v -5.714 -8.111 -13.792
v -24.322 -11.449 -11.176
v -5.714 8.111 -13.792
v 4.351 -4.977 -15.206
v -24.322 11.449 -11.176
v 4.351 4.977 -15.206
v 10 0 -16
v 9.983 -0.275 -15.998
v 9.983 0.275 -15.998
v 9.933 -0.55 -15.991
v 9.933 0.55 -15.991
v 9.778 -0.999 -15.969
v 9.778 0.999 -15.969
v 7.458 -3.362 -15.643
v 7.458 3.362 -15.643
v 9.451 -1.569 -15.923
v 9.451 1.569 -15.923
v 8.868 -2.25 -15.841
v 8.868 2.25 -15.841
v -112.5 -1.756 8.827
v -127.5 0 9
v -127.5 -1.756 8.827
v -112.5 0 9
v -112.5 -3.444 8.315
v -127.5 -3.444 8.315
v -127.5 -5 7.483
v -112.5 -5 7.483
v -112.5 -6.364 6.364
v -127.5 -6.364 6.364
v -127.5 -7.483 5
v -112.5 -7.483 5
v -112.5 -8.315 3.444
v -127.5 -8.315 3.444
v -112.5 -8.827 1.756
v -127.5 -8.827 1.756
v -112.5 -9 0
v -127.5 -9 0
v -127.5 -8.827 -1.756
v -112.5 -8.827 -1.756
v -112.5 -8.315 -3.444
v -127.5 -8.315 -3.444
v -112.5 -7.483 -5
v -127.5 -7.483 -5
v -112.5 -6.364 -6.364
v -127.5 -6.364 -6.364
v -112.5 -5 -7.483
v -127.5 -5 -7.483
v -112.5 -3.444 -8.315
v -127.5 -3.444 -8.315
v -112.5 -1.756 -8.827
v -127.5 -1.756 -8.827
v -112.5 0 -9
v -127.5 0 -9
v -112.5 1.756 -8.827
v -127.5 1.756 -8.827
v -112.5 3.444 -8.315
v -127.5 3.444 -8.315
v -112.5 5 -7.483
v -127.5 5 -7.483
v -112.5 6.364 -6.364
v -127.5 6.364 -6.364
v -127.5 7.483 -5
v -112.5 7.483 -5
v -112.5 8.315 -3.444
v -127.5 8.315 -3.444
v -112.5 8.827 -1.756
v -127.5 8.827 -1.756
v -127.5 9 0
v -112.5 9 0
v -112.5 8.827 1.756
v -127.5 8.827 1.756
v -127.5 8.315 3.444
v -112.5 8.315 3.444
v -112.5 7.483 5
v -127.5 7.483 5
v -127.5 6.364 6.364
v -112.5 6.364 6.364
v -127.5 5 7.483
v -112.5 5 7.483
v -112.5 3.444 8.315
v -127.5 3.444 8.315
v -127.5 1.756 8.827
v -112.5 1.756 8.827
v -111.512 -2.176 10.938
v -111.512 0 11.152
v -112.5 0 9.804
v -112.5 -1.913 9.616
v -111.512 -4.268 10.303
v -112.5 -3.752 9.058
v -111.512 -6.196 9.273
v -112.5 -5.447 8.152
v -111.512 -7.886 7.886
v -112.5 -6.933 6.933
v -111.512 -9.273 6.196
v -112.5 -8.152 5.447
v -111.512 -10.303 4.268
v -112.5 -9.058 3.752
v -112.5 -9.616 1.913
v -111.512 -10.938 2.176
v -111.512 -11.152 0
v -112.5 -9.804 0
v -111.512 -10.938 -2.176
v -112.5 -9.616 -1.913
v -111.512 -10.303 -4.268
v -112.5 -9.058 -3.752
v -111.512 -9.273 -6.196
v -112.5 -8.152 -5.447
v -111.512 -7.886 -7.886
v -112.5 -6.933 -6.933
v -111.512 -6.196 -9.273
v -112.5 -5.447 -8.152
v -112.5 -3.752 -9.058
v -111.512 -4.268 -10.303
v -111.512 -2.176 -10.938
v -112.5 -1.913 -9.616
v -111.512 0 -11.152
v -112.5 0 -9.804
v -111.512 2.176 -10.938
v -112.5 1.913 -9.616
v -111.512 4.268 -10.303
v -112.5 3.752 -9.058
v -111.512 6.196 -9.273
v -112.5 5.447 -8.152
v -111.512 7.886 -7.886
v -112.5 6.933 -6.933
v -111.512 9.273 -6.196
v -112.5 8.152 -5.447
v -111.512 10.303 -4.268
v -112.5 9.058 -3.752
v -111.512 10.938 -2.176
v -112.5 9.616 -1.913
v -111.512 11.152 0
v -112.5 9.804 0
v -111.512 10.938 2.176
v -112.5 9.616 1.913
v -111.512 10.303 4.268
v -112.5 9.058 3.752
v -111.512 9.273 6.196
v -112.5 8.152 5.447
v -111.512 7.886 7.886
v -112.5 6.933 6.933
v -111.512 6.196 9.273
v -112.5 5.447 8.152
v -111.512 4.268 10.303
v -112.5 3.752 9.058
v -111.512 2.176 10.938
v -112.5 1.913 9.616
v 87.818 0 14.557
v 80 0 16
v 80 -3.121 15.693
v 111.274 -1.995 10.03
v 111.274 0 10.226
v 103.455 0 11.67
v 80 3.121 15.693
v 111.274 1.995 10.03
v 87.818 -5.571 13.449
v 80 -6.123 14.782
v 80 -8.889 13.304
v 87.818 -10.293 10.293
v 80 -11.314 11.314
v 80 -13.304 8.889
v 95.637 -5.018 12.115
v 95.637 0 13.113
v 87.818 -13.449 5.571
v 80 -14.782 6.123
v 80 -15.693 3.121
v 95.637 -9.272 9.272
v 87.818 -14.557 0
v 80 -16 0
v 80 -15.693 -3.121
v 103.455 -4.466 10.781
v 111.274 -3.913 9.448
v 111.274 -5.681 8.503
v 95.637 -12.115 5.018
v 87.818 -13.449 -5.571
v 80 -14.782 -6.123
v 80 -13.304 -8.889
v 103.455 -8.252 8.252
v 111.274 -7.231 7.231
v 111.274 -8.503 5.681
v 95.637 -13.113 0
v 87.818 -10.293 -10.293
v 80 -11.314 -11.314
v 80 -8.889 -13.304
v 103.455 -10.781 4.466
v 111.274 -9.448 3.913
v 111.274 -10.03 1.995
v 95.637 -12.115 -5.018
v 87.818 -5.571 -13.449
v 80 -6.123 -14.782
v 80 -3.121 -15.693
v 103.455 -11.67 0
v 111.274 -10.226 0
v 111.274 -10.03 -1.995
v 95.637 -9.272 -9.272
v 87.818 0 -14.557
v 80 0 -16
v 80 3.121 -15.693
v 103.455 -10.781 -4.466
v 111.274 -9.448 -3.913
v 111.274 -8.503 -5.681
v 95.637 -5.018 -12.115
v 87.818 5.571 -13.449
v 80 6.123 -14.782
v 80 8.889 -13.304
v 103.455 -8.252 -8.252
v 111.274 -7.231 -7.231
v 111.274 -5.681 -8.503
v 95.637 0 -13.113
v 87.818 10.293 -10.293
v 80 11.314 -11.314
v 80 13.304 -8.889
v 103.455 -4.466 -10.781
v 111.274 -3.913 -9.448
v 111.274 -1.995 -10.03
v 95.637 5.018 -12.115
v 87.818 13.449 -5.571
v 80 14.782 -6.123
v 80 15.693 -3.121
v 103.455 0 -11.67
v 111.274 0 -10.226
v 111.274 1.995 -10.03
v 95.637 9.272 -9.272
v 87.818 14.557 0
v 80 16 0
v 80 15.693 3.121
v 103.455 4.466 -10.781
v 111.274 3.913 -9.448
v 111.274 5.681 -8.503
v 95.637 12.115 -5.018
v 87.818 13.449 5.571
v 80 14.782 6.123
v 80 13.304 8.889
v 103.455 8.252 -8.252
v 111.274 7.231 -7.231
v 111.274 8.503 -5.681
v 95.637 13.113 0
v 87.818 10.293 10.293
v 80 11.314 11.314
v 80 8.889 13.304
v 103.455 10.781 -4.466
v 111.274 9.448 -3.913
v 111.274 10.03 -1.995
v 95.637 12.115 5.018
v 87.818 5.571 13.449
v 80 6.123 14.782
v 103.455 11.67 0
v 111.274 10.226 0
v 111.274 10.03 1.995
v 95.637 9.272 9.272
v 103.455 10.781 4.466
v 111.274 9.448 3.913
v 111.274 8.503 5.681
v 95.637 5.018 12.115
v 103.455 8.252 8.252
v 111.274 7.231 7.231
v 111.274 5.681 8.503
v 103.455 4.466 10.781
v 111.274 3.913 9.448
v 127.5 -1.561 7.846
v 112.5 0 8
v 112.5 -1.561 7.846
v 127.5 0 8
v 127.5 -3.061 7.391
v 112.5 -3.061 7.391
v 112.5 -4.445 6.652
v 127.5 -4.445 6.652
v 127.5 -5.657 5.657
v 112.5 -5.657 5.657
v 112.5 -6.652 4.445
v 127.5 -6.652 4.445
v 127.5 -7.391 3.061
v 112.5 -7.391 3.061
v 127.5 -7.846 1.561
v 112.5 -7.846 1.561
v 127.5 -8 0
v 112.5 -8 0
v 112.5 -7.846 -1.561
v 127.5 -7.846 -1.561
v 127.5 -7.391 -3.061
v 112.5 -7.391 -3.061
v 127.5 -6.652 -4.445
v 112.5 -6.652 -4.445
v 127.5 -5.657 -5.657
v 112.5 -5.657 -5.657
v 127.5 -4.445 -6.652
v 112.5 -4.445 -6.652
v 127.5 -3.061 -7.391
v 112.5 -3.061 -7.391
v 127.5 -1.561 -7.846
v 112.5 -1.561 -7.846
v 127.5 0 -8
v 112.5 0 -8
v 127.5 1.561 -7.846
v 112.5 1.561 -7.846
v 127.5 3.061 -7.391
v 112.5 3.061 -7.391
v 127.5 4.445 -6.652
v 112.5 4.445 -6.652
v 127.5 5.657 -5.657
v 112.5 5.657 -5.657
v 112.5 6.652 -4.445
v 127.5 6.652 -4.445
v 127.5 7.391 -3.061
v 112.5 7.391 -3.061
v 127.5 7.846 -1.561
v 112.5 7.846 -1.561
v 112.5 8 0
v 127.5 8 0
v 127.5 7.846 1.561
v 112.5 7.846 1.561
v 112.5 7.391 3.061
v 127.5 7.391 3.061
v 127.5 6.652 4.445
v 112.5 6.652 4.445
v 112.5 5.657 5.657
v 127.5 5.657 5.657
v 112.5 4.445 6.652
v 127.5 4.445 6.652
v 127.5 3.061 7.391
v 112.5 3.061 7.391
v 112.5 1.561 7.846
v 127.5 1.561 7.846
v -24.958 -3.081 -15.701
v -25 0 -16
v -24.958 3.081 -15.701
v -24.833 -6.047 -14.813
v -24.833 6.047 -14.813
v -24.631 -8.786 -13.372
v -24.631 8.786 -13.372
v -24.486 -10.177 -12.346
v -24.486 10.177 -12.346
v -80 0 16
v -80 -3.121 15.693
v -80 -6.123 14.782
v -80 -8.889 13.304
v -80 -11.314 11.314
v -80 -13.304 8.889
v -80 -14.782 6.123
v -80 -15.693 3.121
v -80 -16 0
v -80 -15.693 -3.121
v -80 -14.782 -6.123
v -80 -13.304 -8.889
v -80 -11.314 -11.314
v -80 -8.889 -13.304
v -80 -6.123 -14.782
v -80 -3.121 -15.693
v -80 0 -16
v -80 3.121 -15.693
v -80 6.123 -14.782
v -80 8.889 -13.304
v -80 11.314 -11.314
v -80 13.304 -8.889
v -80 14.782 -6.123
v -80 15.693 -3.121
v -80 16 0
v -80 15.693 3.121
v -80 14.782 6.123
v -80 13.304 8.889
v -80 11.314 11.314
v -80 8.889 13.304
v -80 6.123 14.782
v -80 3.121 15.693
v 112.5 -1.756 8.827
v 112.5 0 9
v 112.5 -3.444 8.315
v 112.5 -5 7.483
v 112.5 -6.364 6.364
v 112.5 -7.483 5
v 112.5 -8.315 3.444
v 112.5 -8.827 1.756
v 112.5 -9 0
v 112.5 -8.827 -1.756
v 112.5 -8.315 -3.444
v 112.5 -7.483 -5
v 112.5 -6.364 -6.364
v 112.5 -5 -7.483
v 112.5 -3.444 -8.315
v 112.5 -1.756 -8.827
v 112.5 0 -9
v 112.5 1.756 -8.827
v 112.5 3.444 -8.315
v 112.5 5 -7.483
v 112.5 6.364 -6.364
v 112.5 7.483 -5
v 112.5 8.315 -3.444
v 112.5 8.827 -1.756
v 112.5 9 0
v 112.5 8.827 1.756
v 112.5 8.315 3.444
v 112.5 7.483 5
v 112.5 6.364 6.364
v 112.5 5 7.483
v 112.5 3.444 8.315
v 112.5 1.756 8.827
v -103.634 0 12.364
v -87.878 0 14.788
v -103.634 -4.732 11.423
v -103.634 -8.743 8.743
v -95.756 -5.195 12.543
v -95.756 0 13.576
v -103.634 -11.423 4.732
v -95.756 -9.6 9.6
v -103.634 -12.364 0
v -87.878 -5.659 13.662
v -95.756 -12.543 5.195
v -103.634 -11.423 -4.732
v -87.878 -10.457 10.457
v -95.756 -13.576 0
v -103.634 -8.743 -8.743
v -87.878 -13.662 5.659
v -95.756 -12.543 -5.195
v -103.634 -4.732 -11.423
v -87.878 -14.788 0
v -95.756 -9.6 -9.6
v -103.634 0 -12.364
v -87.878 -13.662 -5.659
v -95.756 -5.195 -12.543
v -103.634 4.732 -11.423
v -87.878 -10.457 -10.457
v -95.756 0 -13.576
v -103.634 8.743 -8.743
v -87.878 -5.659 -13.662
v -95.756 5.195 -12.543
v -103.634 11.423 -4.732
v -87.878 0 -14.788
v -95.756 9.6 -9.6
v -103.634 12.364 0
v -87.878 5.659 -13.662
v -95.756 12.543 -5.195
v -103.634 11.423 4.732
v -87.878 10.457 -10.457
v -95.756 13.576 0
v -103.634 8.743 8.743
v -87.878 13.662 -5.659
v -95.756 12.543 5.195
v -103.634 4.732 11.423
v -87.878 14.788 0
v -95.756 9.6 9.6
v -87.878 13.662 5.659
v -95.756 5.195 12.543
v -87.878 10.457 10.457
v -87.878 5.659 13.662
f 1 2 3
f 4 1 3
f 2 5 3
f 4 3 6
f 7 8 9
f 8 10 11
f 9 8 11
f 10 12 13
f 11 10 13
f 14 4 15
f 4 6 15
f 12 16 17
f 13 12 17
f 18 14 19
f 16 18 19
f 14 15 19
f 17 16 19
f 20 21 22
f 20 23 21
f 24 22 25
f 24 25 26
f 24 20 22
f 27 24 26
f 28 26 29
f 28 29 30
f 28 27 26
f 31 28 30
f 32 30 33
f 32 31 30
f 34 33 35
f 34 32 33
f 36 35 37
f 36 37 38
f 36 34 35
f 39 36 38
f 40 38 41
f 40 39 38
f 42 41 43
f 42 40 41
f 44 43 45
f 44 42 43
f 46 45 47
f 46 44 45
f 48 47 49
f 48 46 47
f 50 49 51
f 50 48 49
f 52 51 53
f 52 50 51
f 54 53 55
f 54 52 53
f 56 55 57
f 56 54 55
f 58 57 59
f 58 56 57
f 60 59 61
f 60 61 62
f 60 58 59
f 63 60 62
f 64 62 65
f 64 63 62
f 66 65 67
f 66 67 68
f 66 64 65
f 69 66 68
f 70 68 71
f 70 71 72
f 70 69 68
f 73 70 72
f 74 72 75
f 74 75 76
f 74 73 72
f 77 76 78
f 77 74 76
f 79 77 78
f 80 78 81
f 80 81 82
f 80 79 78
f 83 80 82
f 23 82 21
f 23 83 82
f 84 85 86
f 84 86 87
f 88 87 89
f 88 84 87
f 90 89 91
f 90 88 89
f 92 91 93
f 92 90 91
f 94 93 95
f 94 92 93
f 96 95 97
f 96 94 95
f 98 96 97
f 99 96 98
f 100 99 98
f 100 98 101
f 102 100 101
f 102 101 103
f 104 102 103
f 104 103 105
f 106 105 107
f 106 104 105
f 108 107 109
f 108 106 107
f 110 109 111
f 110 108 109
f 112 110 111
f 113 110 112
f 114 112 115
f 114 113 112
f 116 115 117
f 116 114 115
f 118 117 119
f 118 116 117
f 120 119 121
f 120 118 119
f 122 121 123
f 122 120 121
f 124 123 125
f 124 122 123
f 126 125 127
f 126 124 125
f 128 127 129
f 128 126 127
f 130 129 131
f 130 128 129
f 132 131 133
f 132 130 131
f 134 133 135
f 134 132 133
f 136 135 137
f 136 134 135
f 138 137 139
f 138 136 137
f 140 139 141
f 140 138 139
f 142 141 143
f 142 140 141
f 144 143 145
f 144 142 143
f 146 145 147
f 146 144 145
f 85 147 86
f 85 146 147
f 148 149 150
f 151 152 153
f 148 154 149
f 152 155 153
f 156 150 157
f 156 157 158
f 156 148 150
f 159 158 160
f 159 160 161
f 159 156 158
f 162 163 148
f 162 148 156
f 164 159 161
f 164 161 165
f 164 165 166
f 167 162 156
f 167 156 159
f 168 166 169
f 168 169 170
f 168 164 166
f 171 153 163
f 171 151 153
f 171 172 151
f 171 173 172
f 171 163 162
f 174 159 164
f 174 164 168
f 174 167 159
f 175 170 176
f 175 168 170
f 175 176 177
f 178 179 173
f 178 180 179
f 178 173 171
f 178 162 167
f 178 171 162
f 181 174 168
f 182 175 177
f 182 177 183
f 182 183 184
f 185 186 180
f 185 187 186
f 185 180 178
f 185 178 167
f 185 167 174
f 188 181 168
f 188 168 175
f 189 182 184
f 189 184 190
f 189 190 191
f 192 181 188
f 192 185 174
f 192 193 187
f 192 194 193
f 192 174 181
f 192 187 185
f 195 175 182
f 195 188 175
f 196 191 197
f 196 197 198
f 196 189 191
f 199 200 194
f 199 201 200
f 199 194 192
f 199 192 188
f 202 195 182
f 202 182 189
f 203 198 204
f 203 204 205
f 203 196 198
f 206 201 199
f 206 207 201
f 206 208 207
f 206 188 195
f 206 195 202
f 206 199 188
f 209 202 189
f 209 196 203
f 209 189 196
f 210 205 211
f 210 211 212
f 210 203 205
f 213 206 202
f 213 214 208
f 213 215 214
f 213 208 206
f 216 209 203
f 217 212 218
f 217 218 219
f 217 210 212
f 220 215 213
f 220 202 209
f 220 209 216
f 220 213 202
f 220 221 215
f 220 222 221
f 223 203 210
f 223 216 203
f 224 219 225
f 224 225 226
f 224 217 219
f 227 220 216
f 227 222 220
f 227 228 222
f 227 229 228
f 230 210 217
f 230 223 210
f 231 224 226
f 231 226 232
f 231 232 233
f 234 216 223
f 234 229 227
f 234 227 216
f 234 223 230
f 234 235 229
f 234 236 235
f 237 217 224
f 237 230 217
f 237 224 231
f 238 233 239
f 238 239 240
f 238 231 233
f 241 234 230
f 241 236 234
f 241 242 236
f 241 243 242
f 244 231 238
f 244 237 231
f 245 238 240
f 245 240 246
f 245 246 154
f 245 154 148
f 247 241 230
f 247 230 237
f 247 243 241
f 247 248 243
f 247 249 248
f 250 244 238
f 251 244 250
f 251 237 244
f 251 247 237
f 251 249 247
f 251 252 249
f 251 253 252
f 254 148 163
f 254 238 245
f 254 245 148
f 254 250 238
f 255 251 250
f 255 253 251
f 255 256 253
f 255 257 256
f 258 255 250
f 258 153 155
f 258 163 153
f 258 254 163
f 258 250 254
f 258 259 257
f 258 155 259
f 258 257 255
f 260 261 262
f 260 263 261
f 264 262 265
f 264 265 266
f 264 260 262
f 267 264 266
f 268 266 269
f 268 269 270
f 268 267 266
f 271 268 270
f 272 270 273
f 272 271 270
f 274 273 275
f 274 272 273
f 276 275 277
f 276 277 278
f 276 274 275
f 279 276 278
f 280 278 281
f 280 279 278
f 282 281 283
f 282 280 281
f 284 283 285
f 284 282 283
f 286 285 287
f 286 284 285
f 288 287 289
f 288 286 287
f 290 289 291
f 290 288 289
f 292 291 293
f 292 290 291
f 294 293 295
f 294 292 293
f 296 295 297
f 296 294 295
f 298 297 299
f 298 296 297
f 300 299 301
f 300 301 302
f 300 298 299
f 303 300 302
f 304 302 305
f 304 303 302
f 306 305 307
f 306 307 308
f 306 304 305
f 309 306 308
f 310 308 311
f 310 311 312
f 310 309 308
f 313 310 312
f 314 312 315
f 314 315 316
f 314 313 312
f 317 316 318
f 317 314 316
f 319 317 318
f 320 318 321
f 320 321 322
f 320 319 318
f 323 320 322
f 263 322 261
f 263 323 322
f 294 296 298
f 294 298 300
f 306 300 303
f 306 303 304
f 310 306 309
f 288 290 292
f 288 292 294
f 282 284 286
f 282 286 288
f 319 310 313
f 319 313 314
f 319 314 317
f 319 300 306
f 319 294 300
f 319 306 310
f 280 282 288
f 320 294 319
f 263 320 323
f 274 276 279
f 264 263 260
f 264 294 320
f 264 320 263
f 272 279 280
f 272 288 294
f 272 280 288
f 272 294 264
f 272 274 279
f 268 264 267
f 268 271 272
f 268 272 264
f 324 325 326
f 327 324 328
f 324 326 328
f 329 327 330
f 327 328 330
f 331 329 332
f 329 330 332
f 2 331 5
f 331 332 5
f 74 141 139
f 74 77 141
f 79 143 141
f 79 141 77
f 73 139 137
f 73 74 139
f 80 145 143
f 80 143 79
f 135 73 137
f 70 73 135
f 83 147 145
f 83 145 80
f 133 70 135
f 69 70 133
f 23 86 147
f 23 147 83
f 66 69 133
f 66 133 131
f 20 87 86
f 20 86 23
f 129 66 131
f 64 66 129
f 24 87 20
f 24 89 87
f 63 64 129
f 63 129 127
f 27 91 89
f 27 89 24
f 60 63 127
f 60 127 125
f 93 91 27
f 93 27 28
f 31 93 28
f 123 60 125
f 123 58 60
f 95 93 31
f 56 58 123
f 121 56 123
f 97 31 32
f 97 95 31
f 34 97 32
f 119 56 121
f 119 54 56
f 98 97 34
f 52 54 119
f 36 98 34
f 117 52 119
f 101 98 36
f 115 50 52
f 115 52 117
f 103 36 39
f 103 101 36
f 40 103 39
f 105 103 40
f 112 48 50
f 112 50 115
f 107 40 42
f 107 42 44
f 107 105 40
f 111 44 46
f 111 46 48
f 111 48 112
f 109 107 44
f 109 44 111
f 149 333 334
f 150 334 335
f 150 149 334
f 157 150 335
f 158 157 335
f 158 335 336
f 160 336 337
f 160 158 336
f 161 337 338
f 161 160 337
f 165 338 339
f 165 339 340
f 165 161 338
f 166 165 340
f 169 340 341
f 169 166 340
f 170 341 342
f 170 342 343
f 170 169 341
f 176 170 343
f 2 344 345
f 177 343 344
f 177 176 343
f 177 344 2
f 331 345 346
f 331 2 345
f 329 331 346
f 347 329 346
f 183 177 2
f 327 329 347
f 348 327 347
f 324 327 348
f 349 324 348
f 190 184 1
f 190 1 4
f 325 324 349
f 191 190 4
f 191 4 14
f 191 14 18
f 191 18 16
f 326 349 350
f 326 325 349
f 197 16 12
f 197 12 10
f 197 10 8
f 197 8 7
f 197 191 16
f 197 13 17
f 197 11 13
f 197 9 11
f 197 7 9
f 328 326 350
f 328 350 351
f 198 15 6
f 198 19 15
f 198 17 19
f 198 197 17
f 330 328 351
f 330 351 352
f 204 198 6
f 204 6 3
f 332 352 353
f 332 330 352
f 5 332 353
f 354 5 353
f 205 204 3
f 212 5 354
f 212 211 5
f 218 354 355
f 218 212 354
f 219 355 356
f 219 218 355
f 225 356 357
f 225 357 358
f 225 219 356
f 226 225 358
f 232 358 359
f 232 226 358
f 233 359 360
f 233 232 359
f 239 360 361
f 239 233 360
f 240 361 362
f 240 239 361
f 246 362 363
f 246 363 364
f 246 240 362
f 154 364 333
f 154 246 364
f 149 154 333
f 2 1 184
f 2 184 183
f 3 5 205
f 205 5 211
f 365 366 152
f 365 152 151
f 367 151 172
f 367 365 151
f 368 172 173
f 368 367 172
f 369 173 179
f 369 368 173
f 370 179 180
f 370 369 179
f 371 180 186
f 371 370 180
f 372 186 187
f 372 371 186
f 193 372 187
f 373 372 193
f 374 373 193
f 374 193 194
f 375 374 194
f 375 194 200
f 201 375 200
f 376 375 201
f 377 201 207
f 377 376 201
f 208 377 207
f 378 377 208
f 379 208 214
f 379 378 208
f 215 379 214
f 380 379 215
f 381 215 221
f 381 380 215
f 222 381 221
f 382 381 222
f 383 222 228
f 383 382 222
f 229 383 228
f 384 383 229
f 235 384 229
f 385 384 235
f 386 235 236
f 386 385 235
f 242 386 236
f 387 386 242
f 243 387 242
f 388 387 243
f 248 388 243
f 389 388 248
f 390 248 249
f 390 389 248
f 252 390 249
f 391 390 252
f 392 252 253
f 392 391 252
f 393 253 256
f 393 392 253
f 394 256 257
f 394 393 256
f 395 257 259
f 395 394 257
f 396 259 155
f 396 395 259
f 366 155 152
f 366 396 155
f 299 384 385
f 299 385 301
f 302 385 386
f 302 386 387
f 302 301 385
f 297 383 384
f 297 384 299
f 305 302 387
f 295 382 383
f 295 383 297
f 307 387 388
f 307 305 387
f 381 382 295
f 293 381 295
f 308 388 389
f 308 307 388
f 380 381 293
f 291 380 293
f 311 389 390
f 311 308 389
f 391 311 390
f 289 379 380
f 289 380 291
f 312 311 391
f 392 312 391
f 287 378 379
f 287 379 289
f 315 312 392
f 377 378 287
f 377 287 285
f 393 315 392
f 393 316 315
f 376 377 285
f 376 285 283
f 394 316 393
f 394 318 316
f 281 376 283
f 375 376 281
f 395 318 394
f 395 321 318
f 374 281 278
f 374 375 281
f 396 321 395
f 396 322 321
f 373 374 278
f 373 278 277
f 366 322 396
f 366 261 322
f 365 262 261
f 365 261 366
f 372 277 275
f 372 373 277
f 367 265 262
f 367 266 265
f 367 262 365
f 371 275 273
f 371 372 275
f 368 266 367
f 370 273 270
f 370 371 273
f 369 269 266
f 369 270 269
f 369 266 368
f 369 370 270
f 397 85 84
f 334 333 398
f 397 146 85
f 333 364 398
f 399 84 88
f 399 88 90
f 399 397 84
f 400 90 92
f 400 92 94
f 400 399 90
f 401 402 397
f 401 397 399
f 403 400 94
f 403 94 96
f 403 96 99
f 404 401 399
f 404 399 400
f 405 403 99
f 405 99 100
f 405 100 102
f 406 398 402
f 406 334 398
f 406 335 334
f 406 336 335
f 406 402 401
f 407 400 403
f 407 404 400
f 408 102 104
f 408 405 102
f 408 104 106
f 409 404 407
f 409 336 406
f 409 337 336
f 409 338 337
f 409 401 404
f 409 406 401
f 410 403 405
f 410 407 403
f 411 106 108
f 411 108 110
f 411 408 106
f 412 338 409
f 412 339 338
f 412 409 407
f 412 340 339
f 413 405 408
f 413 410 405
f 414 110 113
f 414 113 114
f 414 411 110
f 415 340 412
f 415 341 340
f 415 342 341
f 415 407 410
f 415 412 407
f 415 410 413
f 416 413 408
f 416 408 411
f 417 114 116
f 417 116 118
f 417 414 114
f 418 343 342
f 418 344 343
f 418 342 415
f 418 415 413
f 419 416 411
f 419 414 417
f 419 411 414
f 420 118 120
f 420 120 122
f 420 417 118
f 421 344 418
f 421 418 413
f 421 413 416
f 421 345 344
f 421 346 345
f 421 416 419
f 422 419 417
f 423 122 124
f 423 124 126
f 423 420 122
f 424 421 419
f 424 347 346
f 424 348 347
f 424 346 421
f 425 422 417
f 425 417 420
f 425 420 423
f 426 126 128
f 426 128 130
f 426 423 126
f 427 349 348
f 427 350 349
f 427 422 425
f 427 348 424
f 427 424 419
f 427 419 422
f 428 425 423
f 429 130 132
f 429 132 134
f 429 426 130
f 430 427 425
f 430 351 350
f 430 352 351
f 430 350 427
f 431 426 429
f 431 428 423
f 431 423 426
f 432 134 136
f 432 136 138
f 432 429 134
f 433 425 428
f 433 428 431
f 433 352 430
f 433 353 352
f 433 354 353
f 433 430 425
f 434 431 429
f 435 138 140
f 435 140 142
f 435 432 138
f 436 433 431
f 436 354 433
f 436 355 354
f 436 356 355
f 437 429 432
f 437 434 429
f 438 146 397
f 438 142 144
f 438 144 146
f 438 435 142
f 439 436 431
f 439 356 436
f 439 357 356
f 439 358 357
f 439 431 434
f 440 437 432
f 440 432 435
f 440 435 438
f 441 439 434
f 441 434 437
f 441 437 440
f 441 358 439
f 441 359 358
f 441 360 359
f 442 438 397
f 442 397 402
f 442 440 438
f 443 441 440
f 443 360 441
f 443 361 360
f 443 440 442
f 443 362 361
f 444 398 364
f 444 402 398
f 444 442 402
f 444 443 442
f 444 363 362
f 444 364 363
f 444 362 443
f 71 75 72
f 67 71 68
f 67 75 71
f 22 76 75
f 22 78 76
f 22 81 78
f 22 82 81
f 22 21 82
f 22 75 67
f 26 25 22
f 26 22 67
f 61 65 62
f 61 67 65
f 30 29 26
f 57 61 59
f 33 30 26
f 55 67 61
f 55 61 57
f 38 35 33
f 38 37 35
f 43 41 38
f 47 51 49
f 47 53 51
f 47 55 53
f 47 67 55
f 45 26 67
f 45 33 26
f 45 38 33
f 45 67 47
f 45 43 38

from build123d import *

# Parameters (mm, degrees)
CHANFREIN1_SIZE              = 1.195722403
CHANFREIN1_SIZE2             = 1
CHANFREIN1_EDGE_2_SIZE       = 1.247139839
CHANFREIN1_EDGE_2_SIZE2      = 1
ENL_V_MAT_EXTRU_1_DEPTH      = 17
ENL_V_MAT_EXTRU_1_DEPTH_BACK = 17


with BuildPart() as part:
    # Esquisse1 → Révolution1 (revolve)
    with BuildSketch(Plane.XY, mode=Mode.PRIVATE) as r_volution1_sk:
        Polygon((-127.5, 0), (-127.5, 9), (-112.5, 9), (-112.5, 11), (-80, 16), (80, 16), (112.5, 10), (112.5, 8), (127.5, 8), (127.5, 0), align=None)
    revolve(r_volution1_sk.sketch.rotate(Axis((-127.5, 0, 0), (1, 0, 0)), 90), axis=Axis((-127.5, 0, 0), (1, 0, 0)))  # turned: the seam where the file's is

    # Chanfrein1
    chanfrein1_edges = [part.edges().sort_by_distance(p)[0] for p in [
        (-112.5, 0, -11),
    ]]
    chanfrein1_side = [part.faces().sort_by_distance(p)[0] for p in [
        (-112.5, 0, -9.311126984),
    ]]
    chamfer(chanfrein1_edges, length=CHANFREIN1_SIZE, length2=CHANFREIN1_SIZE2, reference=chanfrein1_side[0])

    # Chanfrein1 edge 2
    chanfrein1_edge_2_edges = [part.edges().sort_by_distance(p)[0] for p in [
        (112.5, 0, -10),
    ]]
    chanfrein1_edge_2_side = [part.faces().sort_by_distance(p)[0] for p in [
        (96.25, 0, -13),
    ]]
    chamfer(chanfrein1_edge_2_edges, length=CHANFREIN1_EDGE_2_SIZE, length2=CHANFREIN1_EDGE_2_SIZE2, reference=chanfrein1_edge_2_side[0])

    # Esquisse2 → Enlèv. mat.-Extru.1 (cut, two sides)
    with BuildSketch(Plane(origin=(0, 0, 0), x_dir=(1, 0, 0), z_dir=(0, 1, 0))) as enl_v_mat_extru_1_sk:
        Polygon((-25, 16), (-24.322079679, 11.176346273), (10, 16), align=None)
    extrude(amount=ENL_V_MAT_EXTRU_1_DEPTH, mode=Mode.SUBTRACT)
    extrude(enl_v_mat_extru_1_sk.sketch, amount=-ENL_V_MAT_EXTRU_1_DEPTH_BACK, mode=Mode.SUBTRACT)


solid = part.part
